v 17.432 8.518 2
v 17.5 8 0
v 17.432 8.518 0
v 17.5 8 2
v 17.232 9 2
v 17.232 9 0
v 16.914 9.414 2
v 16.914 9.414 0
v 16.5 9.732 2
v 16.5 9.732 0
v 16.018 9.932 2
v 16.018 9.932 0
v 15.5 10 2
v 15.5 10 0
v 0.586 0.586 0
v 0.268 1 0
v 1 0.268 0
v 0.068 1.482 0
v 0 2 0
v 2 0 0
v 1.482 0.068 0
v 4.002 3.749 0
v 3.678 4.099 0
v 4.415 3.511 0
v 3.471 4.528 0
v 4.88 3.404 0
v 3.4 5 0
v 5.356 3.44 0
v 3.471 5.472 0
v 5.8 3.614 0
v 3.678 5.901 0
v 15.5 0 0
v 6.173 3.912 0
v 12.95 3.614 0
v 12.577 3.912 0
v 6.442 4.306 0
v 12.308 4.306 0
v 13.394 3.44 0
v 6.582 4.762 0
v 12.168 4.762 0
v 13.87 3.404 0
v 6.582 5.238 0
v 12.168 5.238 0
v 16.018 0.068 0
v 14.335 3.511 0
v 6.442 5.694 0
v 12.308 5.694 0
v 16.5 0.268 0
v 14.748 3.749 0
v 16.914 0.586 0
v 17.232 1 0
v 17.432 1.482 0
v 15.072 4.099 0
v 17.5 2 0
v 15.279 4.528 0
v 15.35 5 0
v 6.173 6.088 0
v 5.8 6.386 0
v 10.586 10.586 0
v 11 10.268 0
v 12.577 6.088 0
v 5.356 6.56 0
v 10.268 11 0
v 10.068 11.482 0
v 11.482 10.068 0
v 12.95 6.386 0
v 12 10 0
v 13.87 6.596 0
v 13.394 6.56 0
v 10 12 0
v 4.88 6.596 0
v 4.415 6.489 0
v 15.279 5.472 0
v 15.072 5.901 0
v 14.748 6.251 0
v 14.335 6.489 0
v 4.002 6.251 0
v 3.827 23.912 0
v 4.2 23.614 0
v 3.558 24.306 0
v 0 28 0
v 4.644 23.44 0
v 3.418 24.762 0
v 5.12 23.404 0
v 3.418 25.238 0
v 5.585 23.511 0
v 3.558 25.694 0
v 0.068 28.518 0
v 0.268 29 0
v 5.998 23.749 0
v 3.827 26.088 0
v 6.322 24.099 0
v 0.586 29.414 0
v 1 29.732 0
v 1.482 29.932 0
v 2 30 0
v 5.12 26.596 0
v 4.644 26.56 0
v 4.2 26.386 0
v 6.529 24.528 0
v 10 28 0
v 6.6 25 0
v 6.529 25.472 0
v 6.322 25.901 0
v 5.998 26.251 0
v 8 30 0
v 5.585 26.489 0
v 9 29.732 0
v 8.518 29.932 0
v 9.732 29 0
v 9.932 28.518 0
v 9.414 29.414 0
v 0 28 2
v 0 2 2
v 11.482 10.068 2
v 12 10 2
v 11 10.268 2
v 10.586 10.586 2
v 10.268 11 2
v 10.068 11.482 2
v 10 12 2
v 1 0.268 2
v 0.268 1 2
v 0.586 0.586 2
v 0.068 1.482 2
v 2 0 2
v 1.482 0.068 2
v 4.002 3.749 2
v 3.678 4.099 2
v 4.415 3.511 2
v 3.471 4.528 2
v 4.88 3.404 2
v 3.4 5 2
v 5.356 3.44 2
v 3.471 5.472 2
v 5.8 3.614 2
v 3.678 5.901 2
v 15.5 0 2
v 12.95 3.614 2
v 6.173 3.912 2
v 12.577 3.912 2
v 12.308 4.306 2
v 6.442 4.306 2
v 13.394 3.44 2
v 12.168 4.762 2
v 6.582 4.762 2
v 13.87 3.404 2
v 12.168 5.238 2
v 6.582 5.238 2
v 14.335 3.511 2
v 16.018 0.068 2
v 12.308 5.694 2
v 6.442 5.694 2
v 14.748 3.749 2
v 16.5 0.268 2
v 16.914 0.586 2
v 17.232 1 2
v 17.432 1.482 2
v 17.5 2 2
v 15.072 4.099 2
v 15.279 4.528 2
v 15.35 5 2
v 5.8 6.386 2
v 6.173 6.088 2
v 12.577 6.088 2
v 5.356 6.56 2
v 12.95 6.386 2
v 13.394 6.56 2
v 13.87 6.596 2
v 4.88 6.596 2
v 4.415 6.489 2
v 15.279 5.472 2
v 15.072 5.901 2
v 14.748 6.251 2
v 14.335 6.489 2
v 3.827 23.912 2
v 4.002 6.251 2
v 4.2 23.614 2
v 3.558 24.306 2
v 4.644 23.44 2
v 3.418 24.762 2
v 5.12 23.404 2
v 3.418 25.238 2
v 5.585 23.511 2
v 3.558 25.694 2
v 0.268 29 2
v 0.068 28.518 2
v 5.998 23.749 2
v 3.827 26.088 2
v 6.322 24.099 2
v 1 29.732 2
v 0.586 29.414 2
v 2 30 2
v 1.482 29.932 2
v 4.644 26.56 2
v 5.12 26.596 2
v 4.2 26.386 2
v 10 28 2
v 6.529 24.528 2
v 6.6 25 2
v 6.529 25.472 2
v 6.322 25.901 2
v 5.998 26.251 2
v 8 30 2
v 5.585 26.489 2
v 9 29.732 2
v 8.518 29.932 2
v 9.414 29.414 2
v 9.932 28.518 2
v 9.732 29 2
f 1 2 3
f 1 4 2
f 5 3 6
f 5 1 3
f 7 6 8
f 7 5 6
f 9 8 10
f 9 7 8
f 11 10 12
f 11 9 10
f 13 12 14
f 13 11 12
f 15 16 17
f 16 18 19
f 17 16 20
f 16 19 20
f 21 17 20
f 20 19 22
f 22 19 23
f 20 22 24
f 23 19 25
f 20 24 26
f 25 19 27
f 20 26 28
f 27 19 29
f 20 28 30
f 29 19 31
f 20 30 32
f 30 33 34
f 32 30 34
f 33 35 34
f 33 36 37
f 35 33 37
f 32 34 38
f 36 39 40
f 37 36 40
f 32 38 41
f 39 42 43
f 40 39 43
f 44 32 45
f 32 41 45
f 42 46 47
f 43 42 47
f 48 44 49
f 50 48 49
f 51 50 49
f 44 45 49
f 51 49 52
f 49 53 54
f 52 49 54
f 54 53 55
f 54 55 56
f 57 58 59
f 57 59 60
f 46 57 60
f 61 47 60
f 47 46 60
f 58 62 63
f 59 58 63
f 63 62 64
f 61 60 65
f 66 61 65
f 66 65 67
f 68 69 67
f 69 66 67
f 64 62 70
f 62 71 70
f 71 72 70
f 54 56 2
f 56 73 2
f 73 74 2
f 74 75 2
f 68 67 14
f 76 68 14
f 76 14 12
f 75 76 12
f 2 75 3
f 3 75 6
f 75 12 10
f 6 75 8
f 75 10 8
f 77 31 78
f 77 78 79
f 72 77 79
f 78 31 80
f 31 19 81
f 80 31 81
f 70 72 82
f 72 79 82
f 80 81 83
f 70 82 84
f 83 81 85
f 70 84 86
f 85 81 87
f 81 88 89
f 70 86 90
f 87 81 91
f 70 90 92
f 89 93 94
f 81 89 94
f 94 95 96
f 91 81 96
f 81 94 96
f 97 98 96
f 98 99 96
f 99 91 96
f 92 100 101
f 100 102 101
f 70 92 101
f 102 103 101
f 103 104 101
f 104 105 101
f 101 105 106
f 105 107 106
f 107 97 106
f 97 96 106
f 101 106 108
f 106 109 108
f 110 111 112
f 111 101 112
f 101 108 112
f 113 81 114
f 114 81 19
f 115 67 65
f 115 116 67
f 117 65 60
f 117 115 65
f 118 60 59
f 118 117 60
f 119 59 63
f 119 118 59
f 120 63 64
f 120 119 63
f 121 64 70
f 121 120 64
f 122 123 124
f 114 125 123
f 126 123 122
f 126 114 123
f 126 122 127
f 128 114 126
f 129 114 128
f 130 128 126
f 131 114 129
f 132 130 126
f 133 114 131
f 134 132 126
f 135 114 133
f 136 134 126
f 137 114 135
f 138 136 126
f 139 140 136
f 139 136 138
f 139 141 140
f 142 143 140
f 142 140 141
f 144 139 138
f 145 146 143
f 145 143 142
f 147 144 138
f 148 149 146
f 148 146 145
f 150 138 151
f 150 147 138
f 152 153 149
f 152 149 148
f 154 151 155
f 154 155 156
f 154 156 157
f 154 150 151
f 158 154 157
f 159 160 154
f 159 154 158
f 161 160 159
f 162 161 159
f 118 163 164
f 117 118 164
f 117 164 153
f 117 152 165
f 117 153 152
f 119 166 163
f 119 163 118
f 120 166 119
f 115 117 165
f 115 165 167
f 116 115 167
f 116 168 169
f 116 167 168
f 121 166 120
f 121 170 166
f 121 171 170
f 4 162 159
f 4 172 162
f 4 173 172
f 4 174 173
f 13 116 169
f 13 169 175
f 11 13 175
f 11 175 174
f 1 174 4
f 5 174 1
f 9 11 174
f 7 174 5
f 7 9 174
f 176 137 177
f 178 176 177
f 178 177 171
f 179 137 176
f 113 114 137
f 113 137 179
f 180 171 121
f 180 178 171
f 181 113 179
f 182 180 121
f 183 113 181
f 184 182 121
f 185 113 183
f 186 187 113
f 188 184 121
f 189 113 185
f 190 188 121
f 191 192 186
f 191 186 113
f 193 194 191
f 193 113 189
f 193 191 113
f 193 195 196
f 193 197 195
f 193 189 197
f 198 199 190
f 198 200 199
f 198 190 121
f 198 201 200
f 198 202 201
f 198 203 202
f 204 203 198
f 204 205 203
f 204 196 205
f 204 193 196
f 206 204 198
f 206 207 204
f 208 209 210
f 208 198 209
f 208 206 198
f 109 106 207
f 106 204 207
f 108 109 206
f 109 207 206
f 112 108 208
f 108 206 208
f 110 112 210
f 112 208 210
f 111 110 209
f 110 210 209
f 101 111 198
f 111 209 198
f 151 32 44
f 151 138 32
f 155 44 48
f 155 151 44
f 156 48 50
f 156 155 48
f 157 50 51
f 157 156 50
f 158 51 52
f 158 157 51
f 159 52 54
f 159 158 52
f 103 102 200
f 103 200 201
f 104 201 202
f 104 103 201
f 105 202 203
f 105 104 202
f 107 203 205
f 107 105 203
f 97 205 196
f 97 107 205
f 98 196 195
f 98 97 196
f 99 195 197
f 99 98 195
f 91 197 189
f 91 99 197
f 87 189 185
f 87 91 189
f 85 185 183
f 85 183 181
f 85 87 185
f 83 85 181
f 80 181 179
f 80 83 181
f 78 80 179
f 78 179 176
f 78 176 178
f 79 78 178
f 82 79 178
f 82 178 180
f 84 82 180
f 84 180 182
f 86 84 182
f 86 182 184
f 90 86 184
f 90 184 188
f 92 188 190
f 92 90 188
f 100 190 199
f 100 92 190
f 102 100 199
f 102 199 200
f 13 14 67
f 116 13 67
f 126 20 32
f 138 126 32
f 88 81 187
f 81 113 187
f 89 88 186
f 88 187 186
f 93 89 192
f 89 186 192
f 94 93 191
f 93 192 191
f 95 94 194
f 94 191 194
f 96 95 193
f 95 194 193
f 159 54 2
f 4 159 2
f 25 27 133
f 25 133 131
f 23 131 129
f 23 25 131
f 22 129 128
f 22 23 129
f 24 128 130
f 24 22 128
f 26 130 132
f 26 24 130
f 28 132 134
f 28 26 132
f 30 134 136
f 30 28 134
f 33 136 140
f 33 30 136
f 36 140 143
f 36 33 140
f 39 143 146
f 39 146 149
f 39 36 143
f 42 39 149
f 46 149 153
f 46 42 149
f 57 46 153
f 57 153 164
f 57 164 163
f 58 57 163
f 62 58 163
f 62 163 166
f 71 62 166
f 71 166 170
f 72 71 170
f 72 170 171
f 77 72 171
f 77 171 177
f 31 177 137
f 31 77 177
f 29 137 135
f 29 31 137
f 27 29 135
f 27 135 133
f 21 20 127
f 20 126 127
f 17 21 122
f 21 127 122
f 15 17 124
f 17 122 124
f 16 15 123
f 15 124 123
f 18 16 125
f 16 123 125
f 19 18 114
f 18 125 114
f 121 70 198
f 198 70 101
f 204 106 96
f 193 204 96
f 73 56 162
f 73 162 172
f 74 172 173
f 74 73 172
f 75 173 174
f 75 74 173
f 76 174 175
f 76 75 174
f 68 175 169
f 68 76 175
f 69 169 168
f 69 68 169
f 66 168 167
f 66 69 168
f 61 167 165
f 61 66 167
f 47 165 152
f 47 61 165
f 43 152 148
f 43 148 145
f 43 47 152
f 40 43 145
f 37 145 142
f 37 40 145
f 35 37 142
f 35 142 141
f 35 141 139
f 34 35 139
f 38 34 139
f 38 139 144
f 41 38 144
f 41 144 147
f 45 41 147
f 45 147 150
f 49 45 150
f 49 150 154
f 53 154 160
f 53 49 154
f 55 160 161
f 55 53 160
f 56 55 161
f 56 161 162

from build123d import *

# Parameters (mm, degrees)
SKETCH_1_R      = 1.6
EXTRUDE_1_DEPTH = 2
FILLET_2_R      = 2


with BuildPart() as part:
    # ｽｹｯﾁ1 → ﾎﾞｽ - 押し出し1 (new body)
    with BuildSketch(Plane.XY):
        Polygon((0, 0), (10, 0), (17.5, 0), (17.5, 10), (10, 10), (10, 30), (0, 30), align=None)
        with Locations((5, 25)):
            Circle(SKETCH_1_R, mode=Mode.SUBTRACT)
        with Locations(Location((5, 5, 0), (0, 0, 180))):
            Circle(SKETCH_1_R, mode=Mode.SUBTRACT)
        with Locations((13.75, 5)):
            Circle(SKETCH_1_R, mode=Mode.SUBTRACT)
    extrude(amount=EXTRUDE_1_DEPTH)

    # ﾌｨﾚｯﾄ2
    fillet_2_edges = [part.edges().sort_by_distance(p)[0] for p in [
        (0, 30, 1),
        (10, 30, 1),
        (10, 10, 1),
        (17.5, 10, 1),
        (17.5, 0, 1),
        (0, 0, 1),
    ]]
    fillet(fillet_2_edges, radius=FILLET_2_R)


solid = part.part
